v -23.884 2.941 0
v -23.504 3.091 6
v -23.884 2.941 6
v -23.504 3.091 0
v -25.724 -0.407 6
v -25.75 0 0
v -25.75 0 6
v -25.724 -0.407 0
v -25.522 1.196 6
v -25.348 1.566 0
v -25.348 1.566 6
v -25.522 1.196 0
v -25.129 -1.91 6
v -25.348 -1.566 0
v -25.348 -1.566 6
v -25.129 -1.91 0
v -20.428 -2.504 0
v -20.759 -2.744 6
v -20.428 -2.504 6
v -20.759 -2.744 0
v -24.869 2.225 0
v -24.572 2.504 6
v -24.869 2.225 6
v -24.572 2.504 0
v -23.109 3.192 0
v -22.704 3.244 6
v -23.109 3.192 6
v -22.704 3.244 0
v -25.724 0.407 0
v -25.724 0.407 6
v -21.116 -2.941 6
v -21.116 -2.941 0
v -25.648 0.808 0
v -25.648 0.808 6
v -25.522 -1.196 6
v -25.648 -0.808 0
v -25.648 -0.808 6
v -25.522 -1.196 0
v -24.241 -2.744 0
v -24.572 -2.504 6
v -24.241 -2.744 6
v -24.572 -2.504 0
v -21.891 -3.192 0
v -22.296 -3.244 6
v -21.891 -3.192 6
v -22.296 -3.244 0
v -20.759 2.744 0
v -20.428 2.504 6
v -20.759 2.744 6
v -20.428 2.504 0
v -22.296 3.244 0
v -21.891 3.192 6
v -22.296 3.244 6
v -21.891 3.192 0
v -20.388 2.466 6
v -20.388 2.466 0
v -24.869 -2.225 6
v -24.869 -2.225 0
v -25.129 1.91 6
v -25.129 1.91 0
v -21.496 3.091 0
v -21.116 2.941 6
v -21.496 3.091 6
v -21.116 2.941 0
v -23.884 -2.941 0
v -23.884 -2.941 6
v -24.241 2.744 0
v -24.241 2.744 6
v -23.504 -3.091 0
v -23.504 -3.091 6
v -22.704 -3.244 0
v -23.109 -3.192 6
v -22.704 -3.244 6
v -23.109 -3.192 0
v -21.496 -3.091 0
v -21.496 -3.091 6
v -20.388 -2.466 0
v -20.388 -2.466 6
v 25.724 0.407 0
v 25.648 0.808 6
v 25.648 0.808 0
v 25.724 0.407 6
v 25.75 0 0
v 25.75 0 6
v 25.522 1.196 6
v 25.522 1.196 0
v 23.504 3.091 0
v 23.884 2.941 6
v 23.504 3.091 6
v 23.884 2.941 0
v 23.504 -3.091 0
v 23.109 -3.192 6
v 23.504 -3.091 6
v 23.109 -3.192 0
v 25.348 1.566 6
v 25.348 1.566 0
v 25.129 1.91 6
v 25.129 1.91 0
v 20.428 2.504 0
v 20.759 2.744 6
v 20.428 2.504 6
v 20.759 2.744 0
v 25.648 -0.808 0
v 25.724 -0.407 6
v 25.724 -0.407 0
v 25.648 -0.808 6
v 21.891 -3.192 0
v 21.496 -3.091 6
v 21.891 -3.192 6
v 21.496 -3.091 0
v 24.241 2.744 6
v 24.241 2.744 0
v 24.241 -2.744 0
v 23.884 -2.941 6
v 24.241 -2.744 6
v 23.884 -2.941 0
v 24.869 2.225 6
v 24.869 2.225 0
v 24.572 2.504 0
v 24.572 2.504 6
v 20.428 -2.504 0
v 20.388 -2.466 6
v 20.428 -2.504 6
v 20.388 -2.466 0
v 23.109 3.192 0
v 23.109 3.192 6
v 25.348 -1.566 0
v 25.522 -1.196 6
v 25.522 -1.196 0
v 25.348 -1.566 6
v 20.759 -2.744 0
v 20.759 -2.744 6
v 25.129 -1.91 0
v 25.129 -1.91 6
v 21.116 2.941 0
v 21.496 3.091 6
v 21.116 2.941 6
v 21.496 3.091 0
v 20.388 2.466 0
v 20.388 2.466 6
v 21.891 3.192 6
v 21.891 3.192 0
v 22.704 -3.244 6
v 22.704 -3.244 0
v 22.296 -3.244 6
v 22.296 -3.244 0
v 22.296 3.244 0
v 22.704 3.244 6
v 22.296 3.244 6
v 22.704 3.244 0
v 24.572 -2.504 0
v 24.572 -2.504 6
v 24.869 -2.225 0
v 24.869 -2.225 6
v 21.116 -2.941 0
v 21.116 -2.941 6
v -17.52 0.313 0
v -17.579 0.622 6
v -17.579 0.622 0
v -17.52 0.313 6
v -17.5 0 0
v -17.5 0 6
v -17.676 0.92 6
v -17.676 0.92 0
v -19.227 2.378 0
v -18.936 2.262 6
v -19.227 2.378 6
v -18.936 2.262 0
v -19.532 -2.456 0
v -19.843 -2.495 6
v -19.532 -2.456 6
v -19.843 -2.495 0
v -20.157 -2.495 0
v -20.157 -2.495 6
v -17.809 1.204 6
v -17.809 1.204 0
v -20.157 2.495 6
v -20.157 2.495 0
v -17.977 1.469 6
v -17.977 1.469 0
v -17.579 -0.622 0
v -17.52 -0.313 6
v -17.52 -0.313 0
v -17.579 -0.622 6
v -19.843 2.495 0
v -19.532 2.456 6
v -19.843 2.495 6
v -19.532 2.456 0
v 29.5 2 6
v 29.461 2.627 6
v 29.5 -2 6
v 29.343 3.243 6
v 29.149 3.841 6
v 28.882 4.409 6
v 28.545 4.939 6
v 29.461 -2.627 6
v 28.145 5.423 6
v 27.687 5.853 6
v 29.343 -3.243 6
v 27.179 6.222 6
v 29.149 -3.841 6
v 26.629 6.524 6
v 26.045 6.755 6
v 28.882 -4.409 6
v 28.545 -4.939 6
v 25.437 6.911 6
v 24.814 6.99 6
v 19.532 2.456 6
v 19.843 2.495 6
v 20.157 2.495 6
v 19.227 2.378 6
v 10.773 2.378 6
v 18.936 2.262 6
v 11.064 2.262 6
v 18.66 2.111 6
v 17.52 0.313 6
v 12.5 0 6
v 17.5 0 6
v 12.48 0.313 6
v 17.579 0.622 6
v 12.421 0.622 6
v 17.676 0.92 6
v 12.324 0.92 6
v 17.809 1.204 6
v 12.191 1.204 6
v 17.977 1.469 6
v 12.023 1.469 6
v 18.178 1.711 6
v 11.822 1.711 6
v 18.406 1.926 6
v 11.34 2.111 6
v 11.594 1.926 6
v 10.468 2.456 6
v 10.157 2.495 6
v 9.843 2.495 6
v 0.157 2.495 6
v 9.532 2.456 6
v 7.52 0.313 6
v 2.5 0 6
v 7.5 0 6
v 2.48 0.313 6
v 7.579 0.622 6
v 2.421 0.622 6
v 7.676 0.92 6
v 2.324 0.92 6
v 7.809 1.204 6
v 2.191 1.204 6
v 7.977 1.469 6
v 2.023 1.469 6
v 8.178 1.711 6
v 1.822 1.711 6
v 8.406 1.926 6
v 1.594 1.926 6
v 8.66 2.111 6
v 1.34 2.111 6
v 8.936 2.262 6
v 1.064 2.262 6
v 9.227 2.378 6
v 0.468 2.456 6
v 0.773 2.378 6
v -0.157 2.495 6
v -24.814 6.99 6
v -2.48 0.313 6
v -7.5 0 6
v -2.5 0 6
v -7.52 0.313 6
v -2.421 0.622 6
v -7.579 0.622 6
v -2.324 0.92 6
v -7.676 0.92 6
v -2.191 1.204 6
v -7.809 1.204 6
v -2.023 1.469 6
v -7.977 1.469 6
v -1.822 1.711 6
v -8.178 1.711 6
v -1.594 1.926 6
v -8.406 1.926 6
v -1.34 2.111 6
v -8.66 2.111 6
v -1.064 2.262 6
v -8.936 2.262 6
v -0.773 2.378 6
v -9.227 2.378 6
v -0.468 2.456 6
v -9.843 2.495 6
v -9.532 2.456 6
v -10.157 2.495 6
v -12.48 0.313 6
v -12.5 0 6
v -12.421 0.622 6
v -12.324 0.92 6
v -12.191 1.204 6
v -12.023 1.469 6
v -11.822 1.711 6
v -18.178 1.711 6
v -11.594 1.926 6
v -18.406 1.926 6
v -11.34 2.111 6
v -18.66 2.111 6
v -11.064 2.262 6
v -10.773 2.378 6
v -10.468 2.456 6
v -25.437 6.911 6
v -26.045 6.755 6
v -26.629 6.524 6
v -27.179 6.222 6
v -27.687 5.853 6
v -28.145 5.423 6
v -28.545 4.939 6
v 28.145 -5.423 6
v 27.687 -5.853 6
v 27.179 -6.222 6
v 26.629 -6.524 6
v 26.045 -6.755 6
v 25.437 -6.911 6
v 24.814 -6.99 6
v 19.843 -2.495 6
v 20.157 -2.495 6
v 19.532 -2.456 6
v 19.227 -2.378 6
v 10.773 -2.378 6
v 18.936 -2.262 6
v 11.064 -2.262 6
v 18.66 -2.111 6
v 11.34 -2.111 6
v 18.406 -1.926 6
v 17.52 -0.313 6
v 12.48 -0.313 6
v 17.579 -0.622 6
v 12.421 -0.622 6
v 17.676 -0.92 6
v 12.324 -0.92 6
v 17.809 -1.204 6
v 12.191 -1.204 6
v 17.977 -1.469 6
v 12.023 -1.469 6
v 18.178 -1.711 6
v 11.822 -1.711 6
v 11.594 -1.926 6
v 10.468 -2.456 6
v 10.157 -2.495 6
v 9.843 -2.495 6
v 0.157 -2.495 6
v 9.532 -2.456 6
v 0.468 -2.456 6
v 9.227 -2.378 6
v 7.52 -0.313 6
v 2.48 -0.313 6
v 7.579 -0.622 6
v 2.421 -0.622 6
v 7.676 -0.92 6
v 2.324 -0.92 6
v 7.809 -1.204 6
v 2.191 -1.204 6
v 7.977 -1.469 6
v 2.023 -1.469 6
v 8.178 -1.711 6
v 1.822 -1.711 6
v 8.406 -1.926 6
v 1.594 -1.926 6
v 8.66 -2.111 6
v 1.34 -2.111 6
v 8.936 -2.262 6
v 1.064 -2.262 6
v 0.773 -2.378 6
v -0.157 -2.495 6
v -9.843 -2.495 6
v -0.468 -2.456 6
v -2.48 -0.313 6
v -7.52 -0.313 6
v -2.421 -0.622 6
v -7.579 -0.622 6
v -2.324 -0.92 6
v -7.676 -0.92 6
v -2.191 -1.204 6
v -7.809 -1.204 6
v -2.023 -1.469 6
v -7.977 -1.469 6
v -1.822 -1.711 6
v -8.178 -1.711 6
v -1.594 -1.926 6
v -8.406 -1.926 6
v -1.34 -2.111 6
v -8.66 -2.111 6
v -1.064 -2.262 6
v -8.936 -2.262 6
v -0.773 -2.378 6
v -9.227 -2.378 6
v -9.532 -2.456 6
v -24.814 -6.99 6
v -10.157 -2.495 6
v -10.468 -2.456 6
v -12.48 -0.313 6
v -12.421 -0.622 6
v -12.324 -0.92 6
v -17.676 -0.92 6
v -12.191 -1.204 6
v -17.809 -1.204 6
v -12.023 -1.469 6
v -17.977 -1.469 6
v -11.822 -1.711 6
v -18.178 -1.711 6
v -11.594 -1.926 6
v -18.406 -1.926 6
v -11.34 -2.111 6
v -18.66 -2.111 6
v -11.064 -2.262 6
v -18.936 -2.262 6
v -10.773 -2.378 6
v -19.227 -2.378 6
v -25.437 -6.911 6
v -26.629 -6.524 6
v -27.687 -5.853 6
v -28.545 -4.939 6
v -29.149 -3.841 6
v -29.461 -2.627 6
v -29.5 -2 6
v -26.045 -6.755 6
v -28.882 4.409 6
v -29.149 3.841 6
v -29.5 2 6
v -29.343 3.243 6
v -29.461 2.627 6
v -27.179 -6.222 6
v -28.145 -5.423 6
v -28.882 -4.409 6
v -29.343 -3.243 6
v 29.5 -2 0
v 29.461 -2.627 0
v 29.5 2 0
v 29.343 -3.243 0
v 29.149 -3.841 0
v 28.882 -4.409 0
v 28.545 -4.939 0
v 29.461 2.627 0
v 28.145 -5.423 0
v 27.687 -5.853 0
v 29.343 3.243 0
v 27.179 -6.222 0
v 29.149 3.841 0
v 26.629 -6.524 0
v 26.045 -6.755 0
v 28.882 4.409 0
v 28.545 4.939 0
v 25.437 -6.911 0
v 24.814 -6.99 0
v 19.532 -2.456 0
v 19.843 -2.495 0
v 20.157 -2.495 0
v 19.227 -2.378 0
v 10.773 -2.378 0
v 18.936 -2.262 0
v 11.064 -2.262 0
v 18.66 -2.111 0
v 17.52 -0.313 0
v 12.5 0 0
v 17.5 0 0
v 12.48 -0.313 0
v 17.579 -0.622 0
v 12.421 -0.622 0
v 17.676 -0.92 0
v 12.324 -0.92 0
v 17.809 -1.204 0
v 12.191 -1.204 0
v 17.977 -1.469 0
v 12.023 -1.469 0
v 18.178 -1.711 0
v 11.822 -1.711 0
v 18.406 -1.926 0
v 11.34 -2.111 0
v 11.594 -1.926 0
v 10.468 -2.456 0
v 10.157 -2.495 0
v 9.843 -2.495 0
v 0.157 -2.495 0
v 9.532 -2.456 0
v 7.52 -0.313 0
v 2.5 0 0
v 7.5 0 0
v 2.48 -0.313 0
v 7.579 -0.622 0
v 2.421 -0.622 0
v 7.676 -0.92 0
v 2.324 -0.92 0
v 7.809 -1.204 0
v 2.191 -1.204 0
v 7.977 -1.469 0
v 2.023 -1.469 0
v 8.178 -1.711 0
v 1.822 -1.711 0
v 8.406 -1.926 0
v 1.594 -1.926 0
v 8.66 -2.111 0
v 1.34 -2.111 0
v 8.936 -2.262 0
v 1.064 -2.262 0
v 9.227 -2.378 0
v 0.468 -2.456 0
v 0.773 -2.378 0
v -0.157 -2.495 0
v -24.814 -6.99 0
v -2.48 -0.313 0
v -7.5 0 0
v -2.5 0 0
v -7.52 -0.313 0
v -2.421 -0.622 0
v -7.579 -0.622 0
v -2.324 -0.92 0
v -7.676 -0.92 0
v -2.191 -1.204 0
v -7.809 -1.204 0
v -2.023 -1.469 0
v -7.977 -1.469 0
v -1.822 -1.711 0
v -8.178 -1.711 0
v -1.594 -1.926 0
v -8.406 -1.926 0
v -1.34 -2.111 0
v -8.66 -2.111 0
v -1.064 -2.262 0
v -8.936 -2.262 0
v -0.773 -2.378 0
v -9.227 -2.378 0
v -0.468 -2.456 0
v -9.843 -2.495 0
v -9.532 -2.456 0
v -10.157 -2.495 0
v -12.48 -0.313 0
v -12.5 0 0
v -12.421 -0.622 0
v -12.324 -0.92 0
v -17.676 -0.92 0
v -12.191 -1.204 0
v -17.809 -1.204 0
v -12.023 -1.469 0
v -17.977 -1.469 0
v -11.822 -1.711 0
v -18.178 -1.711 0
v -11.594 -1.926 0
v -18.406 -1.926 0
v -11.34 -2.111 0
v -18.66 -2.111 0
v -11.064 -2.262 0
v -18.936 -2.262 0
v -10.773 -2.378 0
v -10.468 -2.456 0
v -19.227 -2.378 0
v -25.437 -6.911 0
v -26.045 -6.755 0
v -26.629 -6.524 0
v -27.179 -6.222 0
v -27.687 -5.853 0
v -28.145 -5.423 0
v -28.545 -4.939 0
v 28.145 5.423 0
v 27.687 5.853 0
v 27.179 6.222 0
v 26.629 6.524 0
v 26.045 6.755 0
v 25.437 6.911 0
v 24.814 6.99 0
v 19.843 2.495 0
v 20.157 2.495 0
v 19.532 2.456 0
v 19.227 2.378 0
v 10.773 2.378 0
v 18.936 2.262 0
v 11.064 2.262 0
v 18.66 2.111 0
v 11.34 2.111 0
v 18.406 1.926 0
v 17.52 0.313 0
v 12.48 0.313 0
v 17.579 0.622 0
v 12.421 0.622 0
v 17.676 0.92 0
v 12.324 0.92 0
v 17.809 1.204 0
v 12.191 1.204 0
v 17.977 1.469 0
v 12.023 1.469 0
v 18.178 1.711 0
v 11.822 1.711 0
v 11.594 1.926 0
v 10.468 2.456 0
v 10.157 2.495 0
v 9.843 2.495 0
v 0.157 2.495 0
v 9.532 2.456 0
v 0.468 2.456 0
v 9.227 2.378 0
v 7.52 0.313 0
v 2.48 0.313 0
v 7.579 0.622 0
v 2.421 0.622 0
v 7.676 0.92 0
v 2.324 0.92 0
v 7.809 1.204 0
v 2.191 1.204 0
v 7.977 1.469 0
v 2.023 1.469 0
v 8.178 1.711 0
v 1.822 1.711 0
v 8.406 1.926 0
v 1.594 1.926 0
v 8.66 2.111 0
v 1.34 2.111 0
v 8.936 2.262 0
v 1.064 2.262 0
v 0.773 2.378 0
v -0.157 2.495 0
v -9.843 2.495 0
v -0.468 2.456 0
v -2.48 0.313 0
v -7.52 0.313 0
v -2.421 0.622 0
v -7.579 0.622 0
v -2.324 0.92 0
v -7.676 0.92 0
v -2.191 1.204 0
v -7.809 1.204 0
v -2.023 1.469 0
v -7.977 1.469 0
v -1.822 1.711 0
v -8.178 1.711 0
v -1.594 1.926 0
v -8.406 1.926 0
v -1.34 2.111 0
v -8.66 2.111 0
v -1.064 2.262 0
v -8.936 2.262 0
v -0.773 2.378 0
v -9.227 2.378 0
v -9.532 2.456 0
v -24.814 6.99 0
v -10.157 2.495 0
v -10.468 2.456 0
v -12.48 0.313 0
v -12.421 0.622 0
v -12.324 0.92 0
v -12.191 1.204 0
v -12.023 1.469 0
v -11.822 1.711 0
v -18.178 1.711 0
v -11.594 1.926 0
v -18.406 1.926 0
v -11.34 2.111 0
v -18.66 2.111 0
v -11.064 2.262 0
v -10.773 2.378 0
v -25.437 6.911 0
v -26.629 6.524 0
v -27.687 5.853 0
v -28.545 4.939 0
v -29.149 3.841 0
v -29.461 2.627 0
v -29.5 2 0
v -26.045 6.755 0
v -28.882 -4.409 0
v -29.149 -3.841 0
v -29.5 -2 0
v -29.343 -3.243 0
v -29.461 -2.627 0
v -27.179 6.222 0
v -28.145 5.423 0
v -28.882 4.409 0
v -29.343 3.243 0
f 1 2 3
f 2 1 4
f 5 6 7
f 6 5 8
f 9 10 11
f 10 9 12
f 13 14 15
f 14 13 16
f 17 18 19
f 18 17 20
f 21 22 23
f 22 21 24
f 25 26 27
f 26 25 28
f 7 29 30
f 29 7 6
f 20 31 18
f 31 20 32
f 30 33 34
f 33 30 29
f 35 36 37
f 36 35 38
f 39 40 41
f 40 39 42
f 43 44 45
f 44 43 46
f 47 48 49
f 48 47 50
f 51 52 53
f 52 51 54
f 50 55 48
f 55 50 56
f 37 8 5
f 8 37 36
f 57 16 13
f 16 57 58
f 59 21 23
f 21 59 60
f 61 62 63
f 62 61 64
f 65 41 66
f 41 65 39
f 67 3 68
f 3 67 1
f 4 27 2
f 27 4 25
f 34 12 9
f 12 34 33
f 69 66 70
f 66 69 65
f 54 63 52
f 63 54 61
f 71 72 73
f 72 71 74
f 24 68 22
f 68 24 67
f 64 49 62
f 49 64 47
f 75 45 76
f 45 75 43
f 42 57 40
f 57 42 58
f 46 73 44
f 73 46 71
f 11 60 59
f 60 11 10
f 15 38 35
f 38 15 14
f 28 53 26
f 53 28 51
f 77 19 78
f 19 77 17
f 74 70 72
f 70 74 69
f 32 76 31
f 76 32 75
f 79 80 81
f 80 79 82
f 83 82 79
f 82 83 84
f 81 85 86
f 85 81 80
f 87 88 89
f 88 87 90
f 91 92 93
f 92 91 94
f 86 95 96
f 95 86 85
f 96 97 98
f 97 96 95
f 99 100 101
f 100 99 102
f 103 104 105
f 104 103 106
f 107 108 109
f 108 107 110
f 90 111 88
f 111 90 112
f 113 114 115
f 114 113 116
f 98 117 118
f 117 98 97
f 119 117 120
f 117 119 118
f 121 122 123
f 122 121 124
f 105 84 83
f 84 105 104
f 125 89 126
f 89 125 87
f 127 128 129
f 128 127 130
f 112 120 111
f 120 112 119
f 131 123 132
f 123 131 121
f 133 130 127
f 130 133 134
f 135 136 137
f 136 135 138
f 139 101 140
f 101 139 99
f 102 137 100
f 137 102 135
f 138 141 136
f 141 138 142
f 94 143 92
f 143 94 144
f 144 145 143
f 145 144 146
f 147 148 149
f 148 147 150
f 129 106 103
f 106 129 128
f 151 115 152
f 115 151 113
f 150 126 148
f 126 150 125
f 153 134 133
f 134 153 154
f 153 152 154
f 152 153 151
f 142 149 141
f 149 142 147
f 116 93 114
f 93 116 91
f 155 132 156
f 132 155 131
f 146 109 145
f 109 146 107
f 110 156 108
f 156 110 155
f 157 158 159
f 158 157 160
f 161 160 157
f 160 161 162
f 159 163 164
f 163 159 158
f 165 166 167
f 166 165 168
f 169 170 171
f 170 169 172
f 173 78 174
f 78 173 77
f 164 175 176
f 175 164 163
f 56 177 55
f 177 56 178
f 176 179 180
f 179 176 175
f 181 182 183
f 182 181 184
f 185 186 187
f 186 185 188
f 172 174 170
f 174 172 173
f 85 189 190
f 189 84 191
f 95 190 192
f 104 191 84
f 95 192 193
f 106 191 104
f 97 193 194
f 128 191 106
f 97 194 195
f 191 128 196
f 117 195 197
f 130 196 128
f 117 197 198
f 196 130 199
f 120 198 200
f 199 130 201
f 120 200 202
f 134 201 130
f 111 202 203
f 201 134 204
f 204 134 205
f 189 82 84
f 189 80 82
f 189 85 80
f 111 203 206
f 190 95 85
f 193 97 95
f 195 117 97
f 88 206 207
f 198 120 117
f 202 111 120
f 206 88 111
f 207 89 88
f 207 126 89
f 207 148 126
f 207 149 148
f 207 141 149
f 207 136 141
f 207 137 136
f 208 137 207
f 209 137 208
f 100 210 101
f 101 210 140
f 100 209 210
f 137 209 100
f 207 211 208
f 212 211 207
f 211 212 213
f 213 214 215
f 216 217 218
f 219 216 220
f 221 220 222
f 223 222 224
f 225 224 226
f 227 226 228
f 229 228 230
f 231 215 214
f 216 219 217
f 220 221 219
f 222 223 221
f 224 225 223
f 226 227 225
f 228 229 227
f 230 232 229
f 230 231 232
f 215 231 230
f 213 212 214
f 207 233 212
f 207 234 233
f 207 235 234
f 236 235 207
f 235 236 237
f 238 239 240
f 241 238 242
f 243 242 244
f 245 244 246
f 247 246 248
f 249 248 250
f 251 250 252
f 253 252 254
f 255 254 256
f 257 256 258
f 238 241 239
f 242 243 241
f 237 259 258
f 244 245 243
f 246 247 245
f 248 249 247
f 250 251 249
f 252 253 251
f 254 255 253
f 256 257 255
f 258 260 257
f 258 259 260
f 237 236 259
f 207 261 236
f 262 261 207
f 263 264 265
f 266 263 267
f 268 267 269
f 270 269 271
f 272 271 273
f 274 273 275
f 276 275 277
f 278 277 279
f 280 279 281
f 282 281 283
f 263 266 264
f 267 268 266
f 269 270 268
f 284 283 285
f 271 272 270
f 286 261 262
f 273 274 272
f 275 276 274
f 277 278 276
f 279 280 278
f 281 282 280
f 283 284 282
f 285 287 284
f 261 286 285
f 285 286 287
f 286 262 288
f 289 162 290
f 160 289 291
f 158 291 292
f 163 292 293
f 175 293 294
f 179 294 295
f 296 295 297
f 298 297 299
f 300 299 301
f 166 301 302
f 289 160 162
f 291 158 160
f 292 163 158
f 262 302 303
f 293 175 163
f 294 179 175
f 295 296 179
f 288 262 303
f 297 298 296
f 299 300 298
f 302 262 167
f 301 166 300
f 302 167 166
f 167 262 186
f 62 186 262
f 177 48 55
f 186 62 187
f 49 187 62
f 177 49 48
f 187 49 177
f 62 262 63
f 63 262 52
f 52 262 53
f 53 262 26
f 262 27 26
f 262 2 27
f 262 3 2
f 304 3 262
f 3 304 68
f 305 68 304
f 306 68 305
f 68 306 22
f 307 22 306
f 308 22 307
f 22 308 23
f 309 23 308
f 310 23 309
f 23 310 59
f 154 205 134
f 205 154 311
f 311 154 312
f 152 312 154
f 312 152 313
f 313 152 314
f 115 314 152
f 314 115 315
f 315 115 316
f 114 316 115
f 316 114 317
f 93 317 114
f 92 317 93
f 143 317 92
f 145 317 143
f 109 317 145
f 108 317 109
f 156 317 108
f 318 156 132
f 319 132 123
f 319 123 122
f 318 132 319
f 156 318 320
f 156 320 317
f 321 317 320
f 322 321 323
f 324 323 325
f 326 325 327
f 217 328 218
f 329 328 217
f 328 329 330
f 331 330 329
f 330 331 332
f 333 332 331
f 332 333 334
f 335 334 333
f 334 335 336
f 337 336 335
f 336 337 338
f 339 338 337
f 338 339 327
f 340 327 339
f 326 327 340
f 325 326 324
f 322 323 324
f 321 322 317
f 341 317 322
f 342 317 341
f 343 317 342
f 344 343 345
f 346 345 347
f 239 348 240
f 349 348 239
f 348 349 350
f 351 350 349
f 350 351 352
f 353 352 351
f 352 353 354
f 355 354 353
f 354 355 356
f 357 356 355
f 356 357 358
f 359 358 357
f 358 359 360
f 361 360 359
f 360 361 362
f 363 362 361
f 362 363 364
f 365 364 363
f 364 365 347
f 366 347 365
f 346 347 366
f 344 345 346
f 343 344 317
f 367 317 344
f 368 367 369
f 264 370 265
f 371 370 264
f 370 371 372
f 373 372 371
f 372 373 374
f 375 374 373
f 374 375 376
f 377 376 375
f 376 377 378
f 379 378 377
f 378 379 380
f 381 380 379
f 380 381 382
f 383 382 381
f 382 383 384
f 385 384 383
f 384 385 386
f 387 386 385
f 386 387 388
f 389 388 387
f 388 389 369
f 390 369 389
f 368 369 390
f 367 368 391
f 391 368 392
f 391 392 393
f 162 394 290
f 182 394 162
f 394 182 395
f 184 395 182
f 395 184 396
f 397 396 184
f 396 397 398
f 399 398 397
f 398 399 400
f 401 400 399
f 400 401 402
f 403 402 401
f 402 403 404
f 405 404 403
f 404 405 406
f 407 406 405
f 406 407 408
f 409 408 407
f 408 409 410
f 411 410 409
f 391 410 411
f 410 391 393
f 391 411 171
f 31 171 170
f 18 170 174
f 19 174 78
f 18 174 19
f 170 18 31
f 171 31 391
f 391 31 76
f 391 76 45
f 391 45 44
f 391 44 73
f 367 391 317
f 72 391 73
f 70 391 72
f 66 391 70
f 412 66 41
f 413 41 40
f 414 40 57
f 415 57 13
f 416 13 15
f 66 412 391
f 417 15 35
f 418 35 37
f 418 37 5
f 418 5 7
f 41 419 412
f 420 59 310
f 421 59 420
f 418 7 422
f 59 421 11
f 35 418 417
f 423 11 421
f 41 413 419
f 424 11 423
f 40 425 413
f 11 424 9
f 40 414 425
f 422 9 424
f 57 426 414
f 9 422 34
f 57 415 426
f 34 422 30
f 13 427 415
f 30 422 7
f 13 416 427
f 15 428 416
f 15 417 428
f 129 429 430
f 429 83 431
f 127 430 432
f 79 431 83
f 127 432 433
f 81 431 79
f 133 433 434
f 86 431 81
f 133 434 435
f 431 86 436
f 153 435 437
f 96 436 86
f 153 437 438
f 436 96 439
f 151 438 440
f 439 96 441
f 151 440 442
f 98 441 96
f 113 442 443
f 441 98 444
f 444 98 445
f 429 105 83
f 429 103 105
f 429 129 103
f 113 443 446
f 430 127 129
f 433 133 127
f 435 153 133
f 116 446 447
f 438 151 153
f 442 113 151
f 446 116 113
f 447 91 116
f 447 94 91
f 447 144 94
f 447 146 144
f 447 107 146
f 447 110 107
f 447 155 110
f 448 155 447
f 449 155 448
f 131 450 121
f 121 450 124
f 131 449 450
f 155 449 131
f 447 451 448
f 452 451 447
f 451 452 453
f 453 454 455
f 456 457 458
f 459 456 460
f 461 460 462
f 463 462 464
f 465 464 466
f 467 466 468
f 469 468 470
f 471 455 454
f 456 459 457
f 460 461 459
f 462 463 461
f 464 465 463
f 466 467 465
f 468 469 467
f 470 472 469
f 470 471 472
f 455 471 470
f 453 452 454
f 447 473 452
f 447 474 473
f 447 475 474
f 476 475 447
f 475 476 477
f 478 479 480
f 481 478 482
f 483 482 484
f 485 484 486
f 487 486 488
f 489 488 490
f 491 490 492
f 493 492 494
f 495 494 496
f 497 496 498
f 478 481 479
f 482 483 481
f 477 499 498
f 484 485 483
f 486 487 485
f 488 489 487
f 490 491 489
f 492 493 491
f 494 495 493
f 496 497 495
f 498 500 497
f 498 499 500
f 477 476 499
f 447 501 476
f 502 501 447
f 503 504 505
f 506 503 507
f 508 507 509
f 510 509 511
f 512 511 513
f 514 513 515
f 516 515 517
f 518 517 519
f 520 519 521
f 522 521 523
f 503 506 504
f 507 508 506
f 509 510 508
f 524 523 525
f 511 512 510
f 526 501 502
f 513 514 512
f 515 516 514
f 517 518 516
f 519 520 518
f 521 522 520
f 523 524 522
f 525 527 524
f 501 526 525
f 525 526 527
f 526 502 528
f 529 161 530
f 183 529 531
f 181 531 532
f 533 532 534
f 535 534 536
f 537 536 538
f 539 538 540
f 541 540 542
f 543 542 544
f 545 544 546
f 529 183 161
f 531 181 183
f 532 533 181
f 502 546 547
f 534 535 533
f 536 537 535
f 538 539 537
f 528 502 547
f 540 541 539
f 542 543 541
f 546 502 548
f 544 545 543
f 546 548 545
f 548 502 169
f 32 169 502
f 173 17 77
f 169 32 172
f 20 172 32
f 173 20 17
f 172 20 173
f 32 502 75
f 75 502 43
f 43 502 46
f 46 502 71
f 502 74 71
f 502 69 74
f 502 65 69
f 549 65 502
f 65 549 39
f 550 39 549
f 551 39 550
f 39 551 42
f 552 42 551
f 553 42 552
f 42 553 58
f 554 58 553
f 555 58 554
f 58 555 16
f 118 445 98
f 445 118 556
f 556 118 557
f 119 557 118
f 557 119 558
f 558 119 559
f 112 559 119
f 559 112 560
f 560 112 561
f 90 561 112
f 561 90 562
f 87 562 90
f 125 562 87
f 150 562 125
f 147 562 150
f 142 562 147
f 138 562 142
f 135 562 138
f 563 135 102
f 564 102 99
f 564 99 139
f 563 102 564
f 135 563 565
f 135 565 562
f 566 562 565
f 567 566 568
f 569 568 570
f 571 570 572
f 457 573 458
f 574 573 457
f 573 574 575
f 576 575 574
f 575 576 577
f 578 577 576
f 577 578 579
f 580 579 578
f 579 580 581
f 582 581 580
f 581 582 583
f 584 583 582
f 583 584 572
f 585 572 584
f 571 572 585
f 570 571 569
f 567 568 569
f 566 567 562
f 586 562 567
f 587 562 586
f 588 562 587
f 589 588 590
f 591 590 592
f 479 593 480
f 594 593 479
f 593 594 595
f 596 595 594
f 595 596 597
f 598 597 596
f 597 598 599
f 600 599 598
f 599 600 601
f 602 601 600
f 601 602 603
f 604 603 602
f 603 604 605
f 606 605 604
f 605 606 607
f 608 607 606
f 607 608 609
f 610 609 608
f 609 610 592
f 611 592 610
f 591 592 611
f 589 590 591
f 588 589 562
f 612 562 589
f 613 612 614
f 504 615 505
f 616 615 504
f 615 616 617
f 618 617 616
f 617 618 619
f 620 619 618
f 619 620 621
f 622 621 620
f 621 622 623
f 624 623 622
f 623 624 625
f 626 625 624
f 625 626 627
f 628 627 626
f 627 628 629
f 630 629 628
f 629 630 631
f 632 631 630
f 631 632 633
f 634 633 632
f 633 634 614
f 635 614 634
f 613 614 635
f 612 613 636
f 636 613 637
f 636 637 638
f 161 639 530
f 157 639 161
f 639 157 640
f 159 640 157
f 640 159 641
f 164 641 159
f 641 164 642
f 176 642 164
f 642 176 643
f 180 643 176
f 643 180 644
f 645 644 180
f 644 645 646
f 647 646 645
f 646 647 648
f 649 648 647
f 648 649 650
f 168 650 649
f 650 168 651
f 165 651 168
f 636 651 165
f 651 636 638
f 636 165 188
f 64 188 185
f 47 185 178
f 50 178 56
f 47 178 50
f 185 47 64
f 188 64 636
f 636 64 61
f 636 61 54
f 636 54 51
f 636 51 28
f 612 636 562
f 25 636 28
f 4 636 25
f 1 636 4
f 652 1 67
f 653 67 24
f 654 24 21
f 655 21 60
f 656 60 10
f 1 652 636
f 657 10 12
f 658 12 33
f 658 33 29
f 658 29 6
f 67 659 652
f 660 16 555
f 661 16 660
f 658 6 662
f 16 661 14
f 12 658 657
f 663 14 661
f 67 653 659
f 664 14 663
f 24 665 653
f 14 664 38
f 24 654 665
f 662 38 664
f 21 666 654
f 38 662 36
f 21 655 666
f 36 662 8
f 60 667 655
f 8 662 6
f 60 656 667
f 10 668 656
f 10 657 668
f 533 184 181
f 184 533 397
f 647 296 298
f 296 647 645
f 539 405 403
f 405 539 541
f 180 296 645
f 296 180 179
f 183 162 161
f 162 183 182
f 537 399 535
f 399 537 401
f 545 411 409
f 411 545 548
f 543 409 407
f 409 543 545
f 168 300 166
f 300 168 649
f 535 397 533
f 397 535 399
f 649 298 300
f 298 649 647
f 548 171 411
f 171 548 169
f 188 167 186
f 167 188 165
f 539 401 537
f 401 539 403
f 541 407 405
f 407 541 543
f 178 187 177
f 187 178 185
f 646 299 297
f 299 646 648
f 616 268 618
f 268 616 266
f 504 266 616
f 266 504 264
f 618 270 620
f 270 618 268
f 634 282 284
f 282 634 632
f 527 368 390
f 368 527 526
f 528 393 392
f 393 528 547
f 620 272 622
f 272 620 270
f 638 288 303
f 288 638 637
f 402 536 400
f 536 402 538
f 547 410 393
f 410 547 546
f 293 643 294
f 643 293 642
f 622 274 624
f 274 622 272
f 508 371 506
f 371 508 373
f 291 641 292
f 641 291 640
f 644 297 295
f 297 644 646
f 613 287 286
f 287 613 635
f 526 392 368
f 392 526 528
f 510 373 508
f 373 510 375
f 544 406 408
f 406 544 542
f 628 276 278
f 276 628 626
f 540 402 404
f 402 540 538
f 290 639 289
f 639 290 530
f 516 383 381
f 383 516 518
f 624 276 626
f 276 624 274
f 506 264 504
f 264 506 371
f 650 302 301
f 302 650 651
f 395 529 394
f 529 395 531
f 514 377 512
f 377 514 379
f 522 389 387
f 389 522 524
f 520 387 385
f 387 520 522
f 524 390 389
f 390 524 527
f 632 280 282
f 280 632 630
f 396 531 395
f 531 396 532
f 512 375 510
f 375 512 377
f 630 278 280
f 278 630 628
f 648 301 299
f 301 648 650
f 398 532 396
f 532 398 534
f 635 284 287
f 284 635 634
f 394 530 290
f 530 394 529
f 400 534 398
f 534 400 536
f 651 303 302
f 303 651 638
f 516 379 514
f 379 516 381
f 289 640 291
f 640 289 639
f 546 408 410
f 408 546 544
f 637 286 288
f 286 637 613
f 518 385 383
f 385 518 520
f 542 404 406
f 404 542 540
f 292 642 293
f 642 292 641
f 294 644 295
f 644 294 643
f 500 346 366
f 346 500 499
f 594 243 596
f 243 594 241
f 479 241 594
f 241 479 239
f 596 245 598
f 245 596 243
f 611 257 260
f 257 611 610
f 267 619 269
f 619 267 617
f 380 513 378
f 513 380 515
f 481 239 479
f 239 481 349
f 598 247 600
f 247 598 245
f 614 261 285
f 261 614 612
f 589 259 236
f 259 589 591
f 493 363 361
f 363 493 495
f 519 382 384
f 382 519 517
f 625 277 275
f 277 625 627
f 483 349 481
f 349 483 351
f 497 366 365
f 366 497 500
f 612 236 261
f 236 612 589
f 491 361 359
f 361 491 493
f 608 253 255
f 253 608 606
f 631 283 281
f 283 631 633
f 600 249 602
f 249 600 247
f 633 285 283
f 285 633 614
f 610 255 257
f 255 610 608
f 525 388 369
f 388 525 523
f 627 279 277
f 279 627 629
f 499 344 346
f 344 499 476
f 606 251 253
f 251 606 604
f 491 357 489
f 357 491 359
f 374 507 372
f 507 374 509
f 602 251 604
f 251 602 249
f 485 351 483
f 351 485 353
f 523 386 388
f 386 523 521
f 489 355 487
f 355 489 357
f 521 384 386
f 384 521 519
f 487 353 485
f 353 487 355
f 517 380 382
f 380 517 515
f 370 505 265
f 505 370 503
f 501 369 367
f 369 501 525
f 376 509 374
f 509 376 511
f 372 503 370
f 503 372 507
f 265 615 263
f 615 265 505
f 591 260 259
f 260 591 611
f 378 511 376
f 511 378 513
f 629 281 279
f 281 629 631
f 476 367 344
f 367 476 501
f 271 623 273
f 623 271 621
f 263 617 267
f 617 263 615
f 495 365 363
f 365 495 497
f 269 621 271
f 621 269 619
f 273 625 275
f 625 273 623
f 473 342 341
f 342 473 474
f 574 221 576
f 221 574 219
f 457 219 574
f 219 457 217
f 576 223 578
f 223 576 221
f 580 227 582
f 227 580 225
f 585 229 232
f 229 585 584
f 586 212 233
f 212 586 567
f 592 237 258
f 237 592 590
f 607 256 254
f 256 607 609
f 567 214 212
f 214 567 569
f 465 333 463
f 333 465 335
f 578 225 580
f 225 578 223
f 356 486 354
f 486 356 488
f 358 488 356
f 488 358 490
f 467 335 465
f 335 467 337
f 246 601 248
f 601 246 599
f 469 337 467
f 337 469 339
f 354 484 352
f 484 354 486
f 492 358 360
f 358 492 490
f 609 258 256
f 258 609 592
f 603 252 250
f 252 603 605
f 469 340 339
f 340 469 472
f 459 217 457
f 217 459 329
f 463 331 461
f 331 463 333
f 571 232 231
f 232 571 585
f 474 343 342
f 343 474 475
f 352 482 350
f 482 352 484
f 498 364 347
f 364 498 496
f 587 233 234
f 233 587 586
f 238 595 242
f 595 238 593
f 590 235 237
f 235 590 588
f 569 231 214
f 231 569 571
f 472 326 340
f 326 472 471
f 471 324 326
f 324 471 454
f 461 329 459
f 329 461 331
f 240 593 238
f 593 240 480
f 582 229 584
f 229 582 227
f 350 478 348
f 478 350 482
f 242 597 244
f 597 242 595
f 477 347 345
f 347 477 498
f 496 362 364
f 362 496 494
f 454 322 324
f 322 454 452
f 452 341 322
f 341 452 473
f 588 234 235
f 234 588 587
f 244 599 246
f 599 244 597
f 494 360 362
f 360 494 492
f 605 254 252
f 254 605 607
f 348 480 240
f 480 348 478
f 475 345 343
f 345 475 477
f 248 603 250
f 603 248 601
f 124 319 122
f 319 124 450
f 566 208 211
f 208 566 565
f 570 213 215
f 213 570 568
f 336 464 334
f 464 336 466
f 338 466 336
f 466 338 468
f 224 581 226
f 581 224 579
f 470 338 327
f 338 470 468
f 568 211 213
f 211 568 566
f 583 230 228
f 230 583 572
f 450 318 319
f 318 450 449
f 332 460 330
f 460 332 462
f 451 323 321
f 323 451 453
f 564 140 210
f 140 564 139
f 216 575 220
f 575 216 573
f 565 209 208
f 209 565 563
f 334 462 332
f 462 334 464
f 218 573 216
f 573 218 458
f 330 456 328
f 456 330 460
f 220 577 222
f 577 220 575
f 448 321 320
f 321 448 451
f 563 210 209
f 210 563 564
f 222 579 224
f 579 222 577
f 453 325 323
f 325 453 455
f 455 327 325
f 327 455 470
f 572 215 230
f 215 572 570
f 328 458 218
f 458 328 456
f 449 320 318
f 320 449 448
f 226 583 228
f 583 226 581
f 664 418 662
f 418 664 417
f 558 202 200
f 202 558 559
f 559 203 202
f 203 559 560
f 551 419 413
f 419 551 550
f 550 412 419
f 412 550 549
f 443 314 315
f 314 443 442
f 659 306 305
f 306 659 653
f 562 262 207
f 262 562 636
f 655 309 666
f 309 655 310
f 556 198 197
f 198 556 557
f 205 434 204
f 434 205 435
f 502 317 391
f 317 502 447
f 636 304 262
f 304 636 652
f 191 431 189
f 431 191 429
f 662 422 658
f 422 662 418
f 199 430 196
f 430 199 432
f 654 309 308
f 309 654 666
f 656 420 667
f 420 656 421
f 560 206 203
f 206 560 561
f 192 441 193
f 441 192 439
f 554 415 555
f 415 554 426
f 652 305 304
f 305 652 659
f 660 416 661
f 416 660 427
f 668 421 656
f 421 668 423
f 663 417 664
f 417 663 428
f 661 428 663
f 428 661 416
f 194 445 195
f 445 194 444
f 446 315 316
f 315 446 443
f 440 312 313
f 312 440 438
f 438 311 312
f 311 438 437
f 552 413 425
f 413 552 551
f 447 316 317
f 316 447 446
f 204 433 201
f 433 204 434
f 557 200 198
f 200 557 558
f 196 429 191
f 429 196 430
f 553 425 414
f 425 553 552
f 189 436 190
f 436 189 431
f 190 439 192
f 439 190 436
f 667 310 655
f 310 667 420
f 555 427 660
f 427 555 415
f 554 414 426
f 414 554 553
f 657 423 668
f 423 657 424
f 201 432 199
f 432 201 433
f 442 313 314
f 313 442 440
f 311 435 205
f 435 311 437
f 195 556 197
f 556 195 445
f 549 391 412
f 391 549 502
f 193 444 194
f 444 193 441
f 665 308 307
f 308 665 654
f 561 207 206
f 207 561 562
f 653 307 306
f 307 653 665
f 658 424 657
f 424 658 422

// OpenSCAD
$fn = 50;


difference() {
	union() {
		hull() {
			translate(v = [-24.5000000000, 2.0000000000, 0]) {
				cylinder(h = 6, r = 5);
			}
			translate(v = [24.5000000000, 2.0000000000, 0]) {
				cylinder(h = 6, r = 5);
			}
			translate(v = [-24.5000000000, -2.0000000000, 0]) {
				cylinder(h = 6, r = 5);
			}
			translate(v = [24.5000000000, -2.0000000000, 0]) {
				cylinder(h = 6, r = 5);
			}
		}
	}
	union() {
		#translate(v = [-22.5000000000, 0.0000000000, -100.0000000000]) {
			cylinder(h = 200, r = 3.2500000000);
		}
		#translate(v = [-22.5000000000, 0.0000000000, -100.0000000000]) {
			cylinder(h = 200, r = 3.2500000000);
		}
		#translate(v = [22.5000000000, 0.0000000000, -100.0000000000]) {
			cylinder(h = 200, r = 3.2500000000);
		}
		#translate(v = [22.5000000000, 0.0000000000, -100.0000000000]) {
			cylinder(h = 200, r = 3.2500000000);
		}
		#translate(v = [-20.0000000000, 0, 0]) {
			cylinder(h = 6, r = 2.5000000000);
		}
		#translate(v = [-10.0000000000, 0, 0]) {
			cylinder(h = 6, r = 2.5000000000);
		}
		#cylinder(h = 6, r = 2.5000000000);
		#translate(v = [10.0000000000, 0, 0]) {
			cylinder(h = 6, r = 2.5000000000);
		}
		#translate(v = [20.0000000000, 0, 0]) {
			cylinder(h = 6, r = 2.5000000000);
		}
	}
}
